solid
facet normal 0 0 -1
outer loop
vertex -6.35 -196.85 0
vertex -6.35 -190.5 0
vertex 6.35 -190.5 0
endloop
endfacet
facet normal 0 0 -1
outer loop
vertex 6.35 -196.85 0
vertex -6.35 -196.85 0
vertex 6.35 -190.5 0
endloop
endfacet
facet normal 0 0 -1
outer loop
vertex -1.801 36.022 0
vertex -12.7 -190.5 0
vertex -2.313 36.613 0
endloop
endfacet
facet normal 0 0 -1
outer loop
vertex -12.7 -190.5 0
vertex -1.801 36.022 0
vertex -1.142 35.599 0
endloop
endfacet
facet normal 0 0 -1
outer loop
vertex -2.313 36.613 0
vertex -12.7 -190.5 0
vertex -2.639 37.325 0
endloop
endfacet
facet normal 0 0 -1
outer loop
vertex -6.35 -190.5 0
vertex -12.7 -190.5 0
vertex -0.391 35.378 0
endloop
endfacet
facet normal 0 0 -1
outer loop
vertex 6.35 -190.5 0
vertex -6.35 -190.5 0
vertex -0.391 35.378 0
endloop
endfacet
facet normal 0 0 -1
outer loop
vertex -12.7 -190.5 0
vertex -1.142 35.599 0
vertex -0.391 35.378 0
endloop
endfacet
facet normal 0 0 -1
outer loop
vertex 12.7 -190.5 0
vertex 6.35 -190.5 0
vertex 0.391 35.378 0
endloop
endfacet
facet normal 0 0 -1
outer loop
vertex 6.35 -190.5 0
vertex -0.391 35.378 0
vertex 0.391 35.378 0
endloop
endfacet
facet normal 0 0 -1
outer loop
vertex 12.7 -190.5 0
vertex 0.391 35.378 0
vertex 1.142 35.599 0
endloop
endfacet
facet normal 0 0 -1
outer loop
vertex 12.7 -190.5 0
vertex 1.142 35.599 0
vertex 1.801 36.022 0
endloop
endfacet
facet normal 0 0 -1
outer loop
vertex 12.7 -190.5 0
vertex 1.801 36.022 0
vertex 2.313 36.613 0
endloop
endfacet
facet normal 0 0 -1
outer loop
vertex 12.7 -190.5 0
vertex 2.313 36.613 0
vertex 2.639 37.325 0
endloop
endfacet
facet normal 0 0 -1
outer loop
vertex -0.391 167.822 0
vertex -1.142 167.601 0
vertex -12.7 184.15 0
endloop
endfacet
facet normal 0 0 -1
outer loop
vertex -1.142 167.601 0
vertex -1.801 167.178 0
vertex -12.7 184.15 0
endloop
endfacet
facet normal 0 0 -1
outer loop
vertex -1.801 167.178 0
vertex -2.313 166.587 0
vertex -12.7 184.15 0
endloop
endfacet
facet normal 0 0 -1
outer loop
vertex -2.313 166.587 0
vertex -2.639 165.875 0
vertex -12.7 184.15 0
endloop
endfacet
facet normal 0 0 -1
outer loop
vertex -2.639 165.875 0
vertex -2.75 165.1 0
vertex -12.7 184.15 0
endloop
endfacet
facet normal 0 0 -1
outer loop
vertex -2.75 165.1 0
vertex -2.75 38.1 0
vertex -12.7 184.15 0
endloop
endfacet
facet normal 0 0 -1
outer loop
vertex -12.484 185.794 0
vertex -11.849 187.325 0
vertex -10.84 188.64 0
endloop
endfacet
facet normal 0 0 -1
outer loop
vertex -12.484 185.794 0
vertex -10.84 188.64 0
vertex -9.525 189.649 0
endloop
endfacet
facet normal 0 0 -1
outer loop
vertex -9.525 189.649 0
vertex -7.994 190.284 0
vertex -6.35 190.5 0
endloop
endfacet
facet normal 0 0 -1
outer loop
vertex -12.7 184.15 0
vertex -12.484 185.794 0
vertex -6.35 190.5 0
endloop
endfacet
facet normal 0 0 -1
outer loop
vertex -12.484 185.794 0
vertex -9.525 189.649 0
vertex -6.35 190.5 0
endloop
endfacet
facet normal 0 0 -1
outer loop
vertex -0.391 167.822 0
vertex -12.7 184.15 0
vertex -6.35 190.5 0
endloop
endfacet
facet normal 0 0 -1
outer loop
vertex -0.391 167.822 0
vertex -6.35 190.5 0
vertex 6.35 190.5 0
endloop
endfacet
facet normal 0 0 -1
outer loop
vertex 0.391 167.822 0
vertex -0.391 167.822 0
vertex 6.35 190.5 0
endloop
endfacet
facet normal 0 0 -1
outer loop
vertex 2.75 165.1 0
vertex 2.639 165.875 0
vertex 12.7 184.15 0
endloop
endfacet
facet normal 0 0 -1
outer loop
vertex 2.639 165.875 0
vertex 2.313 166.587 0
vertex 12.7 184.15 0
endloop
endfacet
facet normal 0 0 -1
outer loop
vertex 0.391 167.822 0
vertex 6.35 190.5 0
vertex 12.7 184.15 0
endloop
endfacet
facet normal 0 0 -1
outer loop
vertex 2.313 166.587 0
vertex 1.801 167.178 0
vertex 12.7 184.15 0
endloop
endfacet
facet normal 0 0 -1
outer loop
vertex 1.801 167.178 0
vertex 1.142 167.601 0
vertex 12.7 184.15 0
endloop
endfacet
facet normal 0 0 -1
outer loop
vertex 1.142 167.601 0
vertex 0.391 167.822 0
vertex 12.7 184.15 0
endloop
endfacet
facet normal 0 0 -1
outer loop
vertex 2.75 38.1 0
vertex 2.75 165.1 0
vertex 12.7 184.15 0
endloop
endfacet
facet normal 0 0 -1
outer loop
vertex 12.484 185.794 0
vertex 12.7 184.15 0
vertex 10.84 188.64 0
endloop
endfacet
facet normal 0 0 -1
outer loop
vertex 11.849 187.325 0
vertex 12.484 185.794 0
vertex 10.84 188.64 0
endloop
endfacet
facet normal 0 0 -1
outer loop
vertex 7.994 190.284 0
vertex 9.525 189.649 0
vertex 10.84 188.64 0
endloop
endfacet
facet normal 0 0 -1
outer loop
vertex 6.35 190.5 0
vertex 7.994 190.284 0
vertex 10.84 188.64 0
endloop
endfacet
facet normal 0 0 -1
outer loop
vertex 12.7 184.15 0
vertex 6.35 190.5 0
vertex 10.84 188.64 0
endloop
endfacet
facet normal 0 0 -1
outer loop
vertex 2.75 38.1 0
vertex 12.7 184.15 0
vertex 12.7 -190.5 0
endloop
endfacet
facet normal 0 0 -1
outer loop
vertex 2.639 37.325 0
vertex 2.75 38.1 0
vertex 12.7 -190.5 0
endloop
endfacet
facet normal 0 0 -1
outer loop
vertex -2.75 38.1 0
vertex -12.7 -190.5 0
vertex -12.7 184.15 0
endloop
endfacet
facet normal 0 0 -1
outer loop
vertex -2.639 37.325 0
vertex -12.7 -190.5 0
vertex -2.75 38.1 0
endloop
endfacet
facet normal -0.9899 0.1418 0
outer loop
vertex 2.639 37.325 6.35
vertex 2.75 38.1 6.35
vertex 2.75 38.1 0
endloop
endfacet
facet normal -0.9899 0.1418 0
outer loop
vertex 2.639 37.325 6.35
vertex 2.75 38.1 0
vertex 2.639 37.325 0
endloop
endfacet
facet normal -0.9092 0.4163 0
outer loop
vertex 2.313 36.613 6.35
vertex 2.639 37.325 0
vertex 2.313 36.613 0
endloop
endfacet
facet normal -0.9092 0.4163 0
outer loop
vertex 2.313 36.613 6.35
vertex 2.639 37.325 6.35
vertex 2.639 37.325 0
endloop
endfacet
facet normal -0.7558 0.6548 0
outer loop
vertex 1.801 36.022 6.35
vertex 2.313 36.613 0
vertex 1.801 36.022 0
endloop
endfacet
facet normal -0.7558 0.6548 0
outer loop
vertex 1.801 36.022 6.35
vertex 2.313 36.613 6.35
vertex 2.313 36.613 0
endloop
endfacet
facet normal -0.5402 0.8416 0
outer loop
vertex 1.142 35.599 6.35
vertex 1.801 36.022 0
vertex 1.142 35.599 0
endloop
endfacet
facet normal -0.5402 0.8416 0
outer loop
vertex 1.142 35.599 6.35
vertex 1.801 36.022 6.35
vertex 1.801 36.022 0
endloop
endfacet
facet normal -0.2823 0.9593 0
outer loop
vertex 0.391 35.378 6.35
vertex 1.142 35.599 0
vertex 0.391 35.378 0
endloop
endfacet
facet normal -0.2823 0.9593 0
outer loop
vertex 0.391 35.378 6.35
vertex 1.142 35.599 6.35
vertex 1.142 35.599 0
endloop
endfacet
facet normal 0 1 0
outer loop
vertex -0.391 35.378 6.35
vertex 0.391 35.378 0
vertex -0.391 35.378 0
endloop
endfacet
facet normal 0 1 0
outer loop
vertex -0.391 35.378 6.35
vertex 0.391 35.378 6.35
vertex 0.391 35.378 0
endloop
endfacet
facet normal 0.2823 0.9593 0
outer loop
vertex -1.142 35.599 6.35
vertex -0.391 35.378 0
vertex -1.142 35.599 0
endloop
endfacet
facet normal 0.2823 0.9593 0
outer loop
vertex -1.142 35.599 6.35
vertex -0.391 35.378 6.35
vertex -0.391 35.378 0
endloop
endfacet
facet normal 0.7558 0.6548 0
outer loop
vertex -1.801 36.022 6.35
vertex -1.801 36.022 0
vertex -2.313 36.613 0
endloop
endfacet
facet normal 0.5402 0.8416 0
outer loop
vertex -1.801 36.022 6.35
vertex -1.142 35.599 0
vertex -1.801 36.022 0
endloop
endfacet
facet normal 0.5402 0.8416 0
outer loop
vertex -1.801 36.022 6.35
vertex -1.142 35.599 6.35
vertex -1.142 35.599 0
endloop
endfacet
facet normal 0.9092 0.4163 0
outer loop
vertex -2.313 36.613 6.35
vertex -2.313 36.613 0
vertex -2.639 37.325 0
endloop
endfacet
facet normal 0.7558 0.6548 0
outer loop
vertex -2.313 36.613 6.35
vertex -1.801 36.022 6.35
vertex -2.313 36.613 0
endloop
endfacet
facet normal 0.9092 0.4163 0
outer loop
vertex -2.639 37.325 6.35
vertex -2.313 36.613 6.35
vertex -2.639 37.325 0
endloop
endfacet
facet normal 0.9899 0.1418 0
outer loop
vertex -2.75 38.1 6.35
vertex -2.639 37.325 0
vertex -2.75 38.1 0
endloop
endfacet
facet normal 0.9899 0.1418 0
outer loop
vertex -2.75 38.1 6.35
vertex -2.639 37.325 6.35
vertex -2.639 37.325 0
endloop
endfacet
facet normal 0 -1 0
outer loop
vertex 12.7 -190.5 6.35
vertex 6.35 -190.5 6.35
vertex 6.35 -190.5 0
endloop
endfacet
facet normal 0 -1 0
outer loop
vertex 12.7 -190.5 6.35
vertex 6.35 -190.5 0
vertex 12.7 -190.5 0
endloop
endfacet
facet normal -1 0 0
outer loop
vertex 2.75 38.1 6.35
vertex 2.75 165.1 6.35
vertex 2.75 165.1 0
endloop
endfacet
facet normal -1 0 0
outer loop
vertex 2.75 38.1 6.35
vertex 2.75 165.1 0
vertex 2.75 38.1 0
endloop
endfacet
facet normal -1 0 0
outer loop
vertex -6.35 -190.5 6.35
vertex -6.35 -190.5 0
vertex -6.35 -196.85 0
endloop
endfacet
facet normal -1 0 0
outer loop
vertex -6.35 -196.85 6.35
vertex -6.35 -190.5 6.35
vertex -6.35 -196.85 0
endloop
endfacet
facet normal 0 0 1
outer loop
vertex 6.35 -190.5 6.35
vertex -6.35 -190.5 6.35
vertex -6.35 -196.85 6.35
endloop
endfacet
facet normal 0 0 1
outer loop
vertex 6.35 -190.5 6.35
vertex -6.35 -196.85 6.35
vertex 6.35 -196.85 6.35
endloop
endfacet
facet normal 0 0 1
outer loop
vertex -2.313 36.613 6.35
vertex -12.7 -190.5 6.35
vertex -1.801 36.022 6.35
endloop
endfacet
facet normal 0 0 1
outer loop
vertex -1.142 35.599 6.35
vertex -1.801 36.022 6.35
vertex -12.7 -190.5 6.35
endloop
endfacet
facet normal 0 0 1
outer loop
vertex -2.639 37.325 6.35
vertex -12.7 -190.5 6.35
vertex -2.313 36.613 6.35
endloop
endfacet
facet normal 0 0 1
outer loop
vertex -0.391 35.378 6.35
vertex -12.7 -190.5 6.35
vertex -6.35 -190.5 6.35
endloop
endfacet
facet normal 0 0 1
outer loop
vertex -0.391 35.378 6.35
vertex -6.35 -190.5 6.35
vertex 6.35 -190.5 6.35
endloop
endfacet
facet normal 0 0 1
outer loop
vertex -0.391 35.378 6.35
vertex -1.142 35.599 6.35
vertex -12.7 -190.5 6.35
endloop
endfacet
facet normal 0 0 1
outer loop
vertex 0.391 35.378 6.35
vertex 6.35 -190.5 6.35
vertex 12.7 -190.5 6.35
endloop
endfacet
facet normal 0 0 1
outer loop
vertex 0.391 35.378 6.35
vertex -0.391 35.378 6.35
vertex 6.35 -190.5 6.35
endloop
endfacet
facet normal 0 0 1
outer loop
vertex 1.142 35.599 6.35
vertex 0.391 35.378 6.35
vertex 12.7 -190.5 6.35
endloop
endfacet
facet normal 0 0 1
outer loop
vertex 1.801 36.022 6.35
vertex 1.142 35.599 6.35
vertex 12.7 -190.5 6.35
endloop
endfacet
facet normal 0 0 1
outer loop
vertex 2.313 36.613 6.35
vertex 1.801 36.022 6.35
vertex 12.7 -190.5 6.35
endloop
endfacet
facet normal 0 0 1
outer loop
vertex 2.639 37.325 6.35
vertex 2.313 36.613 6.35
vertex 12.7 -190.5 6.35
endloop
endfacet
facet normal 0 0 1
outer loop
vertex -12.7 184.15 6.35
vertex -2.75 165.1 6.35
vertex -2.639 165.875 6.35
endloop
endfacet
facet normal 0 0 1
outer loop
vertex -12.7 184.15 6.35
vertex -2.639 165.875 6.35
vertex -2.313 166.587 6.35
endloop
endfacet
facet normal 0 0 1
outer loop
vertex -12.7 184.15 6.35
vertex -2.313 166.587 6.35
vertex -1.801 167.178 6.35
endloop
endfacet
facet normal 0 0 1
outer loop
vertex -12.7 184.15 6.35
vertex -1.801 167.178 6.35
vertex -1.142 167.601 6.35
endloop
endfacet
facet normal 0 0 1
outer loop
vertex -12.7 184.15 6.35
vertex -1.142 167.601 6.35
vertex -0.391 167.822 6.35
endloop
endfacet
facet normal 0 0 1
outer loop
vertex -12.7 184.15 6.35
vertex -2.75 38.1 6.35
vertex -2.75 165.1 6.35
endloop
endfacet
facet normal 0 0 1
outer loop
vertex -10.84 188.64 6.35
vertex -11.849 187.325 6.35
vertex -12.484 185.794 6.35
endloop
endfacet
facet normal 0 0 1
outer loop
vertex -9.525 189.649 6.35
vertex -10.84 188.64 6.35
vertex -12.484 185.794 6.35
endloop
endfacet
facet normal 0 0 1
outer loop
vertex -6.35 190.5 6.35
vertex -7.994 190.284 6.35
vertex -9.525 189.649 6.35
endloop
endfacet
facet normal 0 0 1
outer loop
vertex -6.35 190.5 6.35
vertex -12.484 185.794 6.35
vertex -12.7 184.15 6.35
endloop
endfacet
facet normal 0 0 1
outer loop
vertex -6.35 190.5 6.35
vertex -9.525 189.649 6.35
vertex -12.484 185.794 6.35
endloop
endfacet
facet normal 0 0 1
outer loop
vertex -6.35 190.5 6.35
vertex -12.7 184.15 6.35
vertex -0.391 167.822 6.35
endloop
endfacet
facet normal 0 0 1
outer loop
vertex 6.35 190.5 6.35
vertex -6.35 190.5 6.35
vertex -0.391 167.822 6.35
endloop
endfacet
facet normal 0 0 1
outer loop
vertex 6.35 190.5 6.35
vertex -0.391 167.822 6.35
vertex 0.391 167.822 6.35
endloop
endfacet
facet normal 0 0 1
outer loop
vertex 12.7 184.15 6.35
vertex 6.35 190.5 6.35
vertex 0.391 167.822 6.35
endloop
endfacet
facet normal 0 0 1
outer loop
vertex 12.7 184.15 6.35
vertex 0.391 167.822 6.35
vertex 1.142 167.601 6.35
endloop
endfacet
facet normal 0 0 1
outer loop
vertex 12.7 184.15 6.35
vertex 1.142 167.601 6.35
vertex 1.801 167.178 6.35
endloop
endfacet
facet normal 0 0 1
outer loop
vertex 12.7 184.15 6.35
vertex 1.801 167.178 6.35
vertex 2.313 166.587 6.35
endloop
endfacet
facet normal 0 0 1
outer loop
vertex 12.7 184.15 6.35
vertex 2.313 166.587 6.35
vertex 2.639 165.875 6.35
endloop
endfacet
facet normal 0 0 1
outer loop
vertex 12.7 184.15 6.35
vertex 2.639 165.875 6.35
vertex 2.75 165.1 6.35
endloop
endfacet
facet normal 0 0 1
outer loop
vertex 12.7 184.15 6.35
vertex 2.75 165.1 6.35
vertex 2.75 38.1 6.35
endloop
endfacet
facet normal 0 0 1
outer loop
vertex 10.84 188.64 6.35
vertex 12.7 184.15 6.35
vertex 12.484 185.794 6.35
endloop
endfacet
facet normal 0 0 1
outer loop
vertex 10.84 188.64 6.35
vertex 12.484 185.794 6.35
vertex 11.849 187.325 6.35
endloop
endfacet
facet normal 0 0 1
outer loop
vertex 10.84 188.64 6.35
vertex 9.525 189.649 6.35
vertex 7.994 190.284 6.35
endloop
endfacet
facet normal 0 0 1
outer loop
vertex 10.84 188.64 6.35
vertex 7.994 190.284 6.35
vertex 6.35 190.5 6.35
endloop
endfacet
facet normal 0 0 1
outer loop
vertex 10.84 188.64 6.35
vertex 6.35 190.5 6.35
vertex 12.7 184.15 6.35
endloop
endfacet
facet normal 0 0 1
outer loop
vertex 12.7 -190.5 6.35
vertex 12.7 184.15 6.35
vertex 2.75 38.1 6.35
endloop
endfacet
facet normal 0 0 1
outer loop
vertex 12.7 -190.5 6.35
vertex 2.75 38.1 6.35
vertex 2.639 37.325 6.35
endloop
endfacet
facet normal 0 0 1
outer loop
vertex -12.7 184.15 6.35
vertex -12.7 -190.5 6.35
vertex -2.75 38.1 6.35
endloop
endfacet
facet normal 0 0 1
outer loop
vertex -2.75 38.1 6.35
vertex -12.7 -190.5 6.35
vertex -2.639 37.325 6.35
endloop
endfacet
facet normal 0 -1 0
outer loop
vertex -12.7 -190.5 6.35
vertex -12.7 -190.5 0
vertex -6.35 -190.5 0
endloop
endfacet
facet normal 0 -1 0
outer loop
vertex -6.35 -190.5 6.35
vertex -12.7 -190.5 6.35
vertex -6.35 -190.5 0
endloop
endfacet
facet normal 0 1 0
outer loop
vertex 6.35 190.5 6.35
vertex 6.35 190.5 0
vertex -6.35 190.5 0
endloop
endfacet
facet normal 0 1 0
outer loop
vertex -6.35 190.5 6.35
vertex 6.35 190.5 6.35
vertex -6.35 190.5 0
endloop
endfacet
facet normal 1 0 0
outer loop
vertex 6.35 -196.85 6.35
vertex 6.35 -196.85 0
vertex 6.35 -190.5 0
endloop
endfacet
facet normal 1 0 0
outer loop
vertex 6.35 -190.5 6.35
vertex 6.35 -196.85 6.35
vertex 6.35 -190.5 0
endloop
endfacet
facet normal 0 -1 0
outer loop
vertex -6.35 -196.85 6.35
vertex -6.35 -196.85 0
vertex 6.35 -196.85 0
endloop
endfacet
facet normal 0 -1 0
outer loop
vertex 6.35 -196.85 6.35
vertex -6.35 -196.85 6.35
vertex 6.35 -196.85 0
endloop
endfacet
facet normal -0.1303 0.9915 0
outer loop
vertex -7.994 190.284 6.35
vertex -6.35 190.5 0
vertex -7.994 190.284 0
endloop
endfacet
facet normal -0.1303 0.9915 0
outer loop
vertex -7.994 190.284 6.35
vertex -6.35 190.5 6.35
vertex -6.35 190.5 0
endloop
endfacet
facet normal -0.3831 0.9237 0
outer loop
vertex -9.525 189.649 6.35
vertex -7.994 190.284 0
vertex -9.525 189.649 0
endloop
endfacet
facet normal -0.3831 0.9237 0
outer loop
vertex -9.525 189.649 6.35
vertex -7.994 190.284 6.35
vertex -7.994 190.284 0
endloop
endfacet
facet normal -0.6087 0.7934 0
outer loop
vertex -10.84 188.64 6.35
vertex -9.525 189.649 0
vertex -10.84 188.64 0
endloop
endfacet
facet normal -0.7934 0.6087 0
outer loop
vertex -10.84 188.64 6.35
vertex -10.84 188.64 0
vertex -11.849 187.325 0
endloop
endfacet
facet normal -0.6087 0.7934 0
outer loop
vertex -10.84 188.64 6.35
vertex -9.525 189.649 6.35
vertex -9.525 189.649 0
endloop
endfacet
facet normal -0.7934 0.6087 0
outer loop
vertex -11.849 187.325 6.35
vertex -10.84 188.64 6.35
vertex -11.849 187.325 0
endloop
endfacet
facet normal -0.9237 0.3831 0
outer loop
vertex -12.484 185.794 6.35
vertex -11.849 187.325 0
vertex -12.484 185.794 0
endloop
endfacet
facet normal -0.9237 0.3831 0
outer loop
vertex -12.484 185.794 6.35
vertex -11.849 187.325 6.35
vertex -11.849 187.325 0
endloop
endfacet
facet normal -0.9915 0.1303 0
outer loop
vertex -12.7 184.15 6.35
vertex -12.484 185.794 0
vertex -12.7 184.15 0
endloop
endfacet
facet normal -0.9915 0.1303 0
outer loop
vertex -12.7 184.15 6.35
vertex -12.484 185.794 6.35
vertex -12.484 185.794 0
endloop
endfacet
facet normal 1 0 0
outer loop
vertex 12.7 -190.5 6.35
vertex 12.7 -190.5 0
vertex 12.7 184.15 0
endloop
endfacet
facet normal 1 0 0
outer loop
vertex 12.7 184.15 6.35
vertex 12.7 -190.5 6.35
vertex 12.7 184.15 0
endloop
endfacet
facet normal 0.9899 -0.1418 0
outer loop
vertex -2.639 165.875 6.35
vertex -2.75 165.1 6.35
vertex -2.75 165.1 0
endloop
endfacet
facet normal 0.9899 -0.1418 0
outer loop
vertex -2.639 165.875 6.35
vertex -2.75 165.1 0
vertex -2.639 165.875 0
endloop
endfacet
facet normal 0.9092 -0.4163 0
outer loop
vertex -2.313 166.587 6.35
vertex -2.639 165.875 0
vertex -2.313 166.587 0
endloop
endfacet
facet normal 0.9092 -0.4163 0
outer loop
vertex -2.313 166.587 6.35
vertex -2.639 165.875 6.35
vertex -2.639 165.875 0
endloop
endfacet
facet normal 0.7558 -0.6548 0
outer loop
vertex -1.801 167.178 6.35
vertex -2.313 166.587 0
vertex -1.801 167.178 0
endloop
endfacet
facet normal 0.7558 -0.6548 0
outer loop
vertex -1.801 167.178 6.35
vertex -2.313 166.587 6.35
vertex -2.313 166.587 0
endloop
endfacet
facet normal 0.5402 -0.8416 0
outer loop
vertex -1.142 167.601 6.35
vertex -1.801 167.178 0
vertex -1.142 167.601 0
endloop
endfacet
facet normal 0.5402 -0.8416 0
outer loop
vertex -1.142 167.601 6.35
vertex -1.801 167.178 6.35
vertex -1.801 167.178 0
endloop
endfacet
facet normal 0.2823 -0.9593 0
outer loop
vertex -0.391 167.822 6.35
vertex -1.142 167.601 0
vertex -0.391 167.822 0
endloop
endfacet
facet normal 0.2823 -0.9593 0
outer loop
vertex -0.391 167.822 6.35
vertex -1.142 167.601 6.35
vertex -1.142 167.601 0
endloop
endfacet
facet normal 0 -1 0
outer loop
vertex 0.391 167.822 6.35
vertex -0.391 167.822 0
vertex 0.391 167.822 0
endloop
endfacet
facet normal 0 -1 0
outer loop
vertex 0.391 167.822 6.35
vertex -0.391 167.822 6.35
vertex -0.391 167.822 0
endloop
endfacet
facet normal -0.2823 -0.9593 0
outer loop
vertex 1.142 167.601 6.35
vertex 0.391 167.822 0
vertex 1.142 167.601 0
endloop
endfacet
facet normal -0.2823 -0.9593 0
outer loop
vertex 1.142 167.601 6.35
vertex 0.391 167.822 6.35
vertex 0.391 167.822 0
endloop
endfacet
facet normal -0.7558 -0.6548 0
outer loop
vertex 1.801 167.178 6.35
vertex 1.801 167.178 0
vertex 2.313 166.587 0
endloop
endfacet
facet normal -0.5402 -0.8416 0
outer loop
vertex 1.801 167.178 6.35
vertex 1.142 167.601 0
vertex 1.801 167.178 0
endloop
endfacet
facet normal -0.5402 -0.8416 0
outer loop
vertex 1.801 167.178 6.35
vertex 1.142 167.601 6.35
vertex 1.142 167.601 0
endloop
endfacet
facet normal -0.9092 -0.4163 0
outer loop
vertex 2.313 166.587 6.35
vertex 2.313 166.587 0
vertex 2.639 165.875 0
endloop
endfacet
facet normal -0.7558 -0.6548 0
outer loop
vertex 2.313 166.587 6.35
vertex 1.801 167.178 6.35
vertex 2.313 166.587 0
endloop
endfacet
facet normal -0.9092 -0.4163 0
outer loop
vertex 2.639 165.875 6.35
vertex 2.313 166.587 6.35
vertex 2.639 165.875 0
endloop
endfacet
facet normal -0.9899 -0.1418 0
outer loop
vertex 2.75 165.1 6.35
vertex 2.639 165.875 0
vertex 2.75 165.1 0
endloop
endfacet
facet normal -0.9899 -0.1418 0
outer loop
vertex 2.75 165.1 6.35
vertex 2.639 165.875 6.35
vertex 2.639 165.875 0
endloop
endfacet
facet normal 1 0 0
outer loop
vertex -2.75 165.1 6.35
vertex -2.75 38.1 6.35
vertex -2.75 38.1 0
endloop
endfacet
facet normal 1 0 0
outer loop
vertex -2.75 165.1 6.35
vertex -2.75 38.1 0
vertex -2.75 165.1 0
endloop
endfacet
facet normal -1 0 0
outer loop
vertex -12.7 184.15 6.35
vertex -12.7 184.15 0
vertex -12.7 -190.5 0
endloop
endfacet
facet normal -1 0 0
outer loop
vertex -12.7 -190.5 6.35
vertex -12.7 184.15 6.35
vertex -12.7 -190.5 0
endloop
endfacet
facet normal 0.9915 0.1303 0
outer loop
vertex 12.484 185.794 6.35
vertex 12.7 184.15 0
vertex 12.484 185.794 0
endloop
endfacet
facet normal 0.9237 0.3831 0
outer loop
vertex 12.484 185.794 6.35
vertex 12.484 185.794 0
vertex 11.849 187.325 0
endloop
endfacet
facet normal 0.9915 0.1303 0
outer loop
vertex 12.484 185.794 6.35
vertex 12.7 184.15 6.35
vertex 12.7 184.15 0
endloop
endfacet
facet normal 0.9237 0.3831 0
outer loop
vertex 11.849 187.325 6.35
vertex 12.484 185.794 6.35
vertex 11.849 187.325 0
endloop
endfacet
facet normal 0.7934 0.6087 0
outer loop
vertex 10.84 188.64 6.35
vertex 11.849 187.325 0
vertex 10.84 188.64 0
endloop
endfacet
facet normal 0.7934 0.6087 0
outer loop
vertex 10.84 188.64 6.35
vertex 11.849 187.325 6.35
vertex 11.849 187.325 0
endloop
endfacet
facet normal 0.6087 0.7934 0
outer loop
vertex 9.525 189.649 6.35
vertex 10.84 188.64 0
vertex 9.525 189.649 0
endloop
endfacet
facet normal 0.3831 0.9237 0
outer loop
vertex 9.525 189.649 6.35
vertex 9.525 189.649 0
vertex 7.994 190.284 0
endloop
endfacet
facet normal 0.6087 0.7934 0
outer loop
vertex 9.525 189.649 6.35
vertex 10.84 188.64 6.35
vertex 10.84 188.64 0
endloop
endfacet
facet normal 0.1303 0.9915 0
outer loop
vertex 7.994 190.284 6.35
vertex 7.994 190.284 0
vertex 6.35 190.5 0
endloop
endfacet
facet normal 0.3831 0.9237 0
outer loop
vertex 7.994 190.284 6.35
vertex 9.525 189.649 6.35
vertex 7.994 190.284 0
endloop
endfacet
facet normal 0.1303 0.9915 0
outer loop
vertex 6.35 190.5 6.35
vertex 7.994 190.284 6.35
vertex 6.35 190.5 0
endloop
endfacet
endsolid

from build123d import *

# Parameters (mm, degrees)
BOSS_EXTRU_1_DEPTH      = 6.35
ENL_V_MAT_EXTRU_2_DEPTH = 198.361432403
CONG_1_R                = 6.35


with BuildPart() as part:
    # Esquisse2 → Boss.-Extru.1 (new body)
    with BuildSketch(Plane.XY):
        Polygon((6.35, -190.5), (12.7, -190.5), (12.7, 190.5), (-12.7, 190.5), (-12.7, -190.5), (-6.35, -190.5), (-6.35, -196.85), (6.35, -196.85), align=None)
    extrude(amount=BOSS_EXTRU_1_DEPTH)

    # Esquisse4 → Enlèv. mat.-Extru.2 (cut, through all)
    with BuildSketch(Plane.XY.offset(6.35)):
        with BuildLine():
            Line((2.75, 165.1), (2.75, 38.1))
            ThreePointArc((2.75, 38.1), (0, 35.35), (-2.75, 38.1))
            Line((-2.75, 38.1), (-2.75, 165.1))
            ThreePointArc((-2.75, 165.1), (0, 167.85), (2.75, 165.1))
        make_face()
    extrude(amount=-ENL_V_MAT_EXTRU_2_DEPTH, mode=Mode.SUBTRACT)

    # Congé1
    cong_1_edges = [part.edges().sort_by_distance(p)[0] for p in [
        (-12.7, 190.5, 3.175),
        (12.7, 190.5, 3.175),
    ]]
    fillet(cong_1_edges, radius=CONG_1_R)


solid = part.part
